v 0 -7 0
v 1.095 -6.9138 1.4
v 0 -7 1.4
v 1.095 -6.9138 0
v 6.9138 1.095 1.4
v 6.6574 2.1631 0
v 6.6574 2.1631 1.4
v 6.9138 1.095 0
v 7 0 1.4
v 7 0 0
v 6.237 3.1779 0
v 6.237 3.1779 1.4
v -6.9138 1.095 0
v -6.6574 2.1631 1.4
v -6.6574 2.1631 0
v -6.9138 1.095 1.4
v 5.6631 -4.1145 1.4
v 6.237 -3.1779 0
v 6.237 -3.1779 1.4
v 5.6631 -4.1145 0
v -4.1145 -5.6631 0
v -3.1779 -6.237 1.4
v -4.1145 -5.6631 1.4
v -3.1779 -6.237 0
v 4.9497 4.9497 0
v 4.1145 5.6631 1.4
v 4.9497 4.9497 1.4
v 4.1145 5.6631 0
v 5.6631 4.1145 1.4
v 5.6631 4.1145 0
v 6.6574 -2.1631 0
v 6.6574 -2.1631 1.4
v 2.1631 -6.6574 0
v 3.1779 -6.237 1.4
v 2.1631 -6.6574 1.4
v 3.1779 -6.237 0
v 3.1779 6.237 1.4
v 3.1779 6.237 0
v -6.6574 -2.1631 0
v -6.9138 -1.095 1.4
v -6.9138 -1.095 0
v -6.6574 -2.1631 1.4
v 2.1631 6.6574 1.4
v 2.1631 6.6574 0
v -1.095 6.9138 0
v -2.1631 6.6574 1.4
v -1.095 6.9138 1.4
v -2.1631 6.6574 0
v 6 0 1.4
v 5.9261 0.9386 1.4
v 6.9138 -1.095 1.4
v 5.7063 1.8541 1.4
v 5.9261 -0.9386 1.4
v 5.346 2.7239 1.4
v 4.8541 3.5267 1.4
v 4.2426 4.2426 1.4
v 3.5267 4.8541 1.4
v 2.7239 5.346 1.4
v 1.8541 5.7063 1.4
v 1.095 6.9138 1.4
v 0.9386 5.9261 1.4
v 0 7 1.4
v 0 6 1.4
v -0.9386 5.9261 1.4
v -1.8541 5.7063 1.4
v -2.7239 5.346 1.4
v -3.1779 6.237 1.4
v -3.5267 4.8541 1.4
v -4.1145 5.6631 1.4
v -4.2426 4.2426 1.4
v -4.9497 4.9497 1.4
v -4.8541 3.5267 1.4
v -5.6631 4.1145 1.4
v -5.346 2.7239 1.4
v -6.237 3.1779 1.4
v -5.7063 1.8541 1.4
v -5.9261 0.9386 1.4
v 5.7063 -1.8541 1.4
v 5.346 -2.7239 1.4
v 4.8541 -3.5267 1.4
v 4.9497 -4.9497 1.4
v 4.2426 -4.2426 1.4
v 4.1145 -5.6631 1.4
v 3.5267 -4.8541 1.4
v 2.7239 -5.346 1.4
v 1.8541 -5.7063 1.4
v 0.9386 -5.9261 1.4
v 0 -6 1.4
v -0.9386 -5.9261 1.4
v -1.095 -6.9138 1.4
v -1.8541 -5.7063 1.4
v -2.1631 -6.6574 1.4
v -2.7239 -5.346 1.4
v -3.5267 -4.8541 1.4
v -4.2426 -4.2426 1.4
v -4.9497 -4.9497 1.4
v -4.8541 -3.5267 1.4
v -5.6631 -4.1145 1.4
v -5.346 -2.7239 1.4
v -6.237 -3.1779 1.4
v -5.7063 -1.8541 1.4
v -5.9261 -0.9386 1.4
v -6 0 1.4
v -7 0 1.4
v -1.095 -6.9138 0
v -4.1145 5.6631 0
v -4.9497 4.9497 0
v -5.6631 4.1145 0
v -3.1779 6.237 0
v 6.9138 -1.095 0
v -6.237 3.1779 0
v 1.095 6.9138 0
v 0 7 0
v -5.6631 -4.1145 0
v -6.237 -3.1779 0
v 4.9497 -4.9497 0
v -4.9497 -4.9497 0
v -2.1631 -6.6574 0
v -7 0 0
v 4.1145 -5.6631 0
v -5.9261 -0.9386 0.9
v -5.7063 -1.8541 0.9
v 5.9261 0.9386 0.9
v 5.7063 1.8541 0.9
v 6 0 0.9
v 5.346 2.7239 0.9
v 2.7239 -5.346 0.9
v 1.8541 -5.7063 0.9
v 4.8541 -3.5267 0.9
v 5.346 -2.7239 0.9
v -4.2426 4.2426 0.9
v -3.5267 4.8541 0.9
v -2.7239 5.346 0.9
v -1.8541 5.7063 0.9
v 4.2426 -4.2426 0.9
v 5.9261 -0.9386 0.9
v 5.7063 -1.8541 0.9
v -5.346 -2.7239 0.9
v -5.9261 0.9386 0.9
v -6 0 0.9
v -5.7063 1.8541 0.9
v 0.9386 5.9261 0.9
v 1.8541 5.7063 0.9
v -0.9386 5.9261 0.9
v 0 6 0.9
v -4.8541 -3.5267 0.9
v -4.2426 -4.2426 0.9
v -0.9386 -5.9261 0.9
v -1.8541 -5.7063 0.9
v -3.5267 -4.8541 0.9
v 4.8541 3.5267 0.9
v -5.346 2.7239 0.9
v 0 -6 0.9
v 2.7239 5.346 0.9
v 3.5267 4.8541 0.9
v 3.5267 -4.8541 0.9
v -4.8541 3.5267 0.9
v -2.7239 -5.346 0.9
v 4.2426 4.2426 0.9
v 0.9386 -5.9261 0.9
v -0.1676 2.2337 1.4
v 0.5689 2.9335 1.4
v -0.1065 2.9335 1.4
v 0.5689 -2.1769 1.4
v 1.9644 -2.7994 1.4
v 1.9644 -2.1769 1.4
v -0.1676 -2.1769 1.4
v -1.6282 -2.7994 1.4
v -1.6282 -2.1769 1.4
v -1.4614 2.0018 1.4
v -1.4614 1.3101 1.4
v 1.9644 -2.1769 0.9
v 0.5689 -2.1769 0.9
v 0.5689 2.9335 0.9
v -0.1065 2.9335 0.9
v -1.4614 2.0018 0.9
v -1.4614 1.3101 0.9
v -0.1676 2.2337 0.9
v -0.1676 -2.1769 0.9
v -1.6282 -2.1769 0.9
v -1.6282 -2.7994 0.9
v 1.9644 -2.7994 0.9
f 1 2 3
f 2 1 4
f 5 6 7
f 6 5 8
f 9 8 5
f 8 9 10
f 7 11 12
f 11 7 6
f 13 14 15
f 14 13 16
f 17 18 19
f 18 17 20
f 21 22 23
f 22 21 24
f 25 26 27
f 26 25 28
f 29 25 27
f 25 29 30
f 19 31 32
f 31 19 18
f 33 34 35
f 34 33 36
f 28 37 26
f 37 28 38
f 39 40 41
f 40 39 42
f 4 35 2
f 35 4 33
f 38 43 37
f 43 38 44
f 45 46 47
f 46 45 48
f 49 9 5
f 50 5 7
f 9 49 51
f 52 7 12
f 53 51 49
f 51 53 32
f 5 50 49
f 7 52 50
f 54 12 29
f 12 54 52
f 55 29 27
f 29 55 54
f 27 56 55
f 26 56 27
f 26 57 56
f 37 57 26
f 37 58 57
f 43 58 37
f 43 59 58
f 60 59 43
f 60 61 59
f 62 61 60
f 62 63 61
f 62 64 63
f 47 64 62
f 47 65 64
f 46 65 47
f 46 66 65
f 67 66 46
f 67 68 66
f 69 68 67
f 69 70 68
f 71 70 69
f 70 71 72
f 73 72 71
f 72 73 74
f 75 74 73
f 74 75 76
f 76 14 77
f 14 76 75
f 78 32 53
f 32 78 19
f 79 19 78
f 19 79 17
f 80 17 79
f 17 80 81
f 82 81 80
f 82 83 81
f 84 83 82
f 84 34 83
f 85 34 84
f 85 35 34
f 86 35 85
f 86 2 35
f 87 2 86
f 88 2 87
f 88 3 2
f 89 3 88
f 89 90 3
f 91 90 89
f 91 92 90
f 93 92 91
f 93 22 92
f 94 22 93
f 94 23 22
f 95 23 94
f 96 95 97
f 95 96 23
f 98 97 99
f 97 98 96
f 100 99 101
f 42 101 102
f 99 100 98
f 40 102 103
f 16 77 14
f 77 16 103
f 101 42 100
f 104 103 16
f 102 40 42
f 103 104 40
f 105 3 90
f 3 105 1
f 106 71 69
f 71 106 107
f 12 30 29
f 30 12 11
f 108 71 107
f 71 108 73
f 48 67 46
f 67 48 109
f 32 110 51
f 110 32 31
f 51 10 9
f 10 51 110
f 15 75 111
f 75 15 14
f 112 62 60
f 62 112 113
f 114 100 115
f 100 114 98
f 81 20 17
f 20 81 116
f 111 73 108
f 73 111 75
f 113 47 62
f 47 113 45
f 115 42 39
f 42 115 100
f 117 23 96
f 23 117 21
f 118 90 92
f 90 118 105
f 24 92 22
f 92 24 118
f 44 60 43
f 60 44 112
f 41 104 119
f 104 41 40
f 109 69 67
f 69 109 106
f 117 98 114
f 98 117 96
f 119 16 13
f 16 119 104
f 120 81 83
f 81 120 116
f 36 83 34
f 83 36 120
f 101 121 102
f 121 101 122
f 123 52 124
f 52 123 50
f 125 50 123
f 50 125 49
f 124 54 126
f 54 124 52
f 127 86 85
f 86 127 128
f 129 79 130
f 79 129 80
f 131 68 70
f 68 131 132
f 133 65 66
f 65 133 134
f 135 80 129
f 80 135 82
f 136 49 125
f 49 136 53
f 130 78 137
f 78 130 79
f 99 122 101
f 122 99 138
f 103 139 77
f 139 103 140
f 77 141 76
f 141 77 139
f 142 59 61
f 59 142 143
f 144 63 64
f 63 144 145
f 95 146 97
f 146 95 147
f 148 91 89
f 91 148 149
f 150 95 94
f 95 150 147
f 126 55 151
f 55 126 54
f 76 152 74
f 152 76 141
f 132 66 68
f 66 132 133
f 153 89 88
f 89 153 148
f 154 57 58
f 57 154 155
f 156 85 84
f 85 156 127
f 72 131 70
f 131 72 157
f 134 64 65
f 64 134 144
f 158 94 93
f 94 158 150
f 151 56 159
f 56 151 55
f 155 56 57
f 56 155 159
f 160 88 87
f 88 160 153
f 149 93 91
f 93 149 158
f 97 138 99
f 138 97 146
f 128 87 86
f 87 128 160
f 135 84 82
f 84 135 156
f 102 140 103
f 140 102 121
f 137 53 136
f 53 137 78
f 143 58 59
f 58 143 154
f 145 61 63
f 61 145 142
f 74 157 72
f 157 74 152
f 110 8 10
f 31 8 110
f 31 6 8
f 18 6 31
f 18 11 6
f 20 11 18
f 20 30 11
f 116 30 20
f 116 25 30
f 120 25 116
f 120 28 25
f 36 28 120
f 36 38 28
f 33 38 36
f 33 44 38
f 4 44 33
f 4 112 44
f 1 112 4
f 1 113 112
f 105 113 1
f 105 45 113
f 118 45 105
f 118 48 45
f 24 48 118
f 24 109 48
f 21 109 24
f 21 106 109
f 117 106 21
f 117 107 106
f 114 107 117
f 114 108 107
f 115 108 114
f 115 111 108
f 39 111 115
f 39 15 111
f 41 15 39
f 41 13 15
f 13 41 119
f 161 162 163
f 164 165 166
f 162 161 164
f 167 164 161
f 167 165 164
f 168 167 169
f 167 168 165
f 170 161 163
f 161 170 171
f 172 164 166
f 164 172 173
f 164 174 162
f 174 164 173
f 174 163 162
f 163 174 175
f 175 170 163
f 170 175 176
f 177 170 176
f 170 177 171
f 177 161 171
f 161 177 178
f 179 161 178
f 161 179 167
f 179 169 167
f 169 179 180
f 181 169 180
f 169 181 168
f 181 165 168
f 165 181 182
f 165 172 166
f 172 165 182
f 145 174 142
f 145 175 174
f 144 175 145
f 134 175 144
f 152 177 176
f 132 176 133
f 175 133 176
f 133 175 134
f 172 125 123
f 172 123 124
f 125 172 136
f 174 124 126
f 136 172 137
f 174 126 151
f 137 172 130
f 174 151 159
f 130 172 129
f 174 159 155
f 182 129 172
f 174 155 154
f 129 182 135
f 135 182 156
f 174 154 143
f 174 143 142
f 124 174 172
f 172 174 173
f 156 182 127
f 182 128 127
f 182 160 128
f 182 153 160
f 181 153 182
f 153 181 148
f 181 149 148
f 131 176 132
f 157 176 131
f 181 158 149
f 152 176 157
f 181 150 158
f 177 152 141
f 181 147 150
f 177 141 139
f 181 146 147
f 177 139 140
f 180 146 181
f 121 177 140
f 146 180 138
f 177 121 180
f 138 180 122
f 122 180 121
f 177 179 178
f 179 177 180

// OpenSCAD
thetext = "1";
base_height = 0.9;
radius = 7;
text_height = 1.4;
text_size = 6;
unendlich = 1000;

difference() {
    union() {
        linear_extrude(text_height) text(text=thetext, 
                                         font="Liberation Sans", 
                                         size=text_size, 
                                         halign="center", 
                                         valign="center");
        cylinder(r1=radius,r2=radius,h=base_height, $fn=40);
        difference() {
            translate([0,0,0.5]) cylinder(r1=radius,r2=radius,h=base_height, $fn=40);
            translate([0,0,-unendlich/2]) cylinder(r1=radius-1,r2=radius-1,h=unendlich, $fn=40);
        }
    }
}
